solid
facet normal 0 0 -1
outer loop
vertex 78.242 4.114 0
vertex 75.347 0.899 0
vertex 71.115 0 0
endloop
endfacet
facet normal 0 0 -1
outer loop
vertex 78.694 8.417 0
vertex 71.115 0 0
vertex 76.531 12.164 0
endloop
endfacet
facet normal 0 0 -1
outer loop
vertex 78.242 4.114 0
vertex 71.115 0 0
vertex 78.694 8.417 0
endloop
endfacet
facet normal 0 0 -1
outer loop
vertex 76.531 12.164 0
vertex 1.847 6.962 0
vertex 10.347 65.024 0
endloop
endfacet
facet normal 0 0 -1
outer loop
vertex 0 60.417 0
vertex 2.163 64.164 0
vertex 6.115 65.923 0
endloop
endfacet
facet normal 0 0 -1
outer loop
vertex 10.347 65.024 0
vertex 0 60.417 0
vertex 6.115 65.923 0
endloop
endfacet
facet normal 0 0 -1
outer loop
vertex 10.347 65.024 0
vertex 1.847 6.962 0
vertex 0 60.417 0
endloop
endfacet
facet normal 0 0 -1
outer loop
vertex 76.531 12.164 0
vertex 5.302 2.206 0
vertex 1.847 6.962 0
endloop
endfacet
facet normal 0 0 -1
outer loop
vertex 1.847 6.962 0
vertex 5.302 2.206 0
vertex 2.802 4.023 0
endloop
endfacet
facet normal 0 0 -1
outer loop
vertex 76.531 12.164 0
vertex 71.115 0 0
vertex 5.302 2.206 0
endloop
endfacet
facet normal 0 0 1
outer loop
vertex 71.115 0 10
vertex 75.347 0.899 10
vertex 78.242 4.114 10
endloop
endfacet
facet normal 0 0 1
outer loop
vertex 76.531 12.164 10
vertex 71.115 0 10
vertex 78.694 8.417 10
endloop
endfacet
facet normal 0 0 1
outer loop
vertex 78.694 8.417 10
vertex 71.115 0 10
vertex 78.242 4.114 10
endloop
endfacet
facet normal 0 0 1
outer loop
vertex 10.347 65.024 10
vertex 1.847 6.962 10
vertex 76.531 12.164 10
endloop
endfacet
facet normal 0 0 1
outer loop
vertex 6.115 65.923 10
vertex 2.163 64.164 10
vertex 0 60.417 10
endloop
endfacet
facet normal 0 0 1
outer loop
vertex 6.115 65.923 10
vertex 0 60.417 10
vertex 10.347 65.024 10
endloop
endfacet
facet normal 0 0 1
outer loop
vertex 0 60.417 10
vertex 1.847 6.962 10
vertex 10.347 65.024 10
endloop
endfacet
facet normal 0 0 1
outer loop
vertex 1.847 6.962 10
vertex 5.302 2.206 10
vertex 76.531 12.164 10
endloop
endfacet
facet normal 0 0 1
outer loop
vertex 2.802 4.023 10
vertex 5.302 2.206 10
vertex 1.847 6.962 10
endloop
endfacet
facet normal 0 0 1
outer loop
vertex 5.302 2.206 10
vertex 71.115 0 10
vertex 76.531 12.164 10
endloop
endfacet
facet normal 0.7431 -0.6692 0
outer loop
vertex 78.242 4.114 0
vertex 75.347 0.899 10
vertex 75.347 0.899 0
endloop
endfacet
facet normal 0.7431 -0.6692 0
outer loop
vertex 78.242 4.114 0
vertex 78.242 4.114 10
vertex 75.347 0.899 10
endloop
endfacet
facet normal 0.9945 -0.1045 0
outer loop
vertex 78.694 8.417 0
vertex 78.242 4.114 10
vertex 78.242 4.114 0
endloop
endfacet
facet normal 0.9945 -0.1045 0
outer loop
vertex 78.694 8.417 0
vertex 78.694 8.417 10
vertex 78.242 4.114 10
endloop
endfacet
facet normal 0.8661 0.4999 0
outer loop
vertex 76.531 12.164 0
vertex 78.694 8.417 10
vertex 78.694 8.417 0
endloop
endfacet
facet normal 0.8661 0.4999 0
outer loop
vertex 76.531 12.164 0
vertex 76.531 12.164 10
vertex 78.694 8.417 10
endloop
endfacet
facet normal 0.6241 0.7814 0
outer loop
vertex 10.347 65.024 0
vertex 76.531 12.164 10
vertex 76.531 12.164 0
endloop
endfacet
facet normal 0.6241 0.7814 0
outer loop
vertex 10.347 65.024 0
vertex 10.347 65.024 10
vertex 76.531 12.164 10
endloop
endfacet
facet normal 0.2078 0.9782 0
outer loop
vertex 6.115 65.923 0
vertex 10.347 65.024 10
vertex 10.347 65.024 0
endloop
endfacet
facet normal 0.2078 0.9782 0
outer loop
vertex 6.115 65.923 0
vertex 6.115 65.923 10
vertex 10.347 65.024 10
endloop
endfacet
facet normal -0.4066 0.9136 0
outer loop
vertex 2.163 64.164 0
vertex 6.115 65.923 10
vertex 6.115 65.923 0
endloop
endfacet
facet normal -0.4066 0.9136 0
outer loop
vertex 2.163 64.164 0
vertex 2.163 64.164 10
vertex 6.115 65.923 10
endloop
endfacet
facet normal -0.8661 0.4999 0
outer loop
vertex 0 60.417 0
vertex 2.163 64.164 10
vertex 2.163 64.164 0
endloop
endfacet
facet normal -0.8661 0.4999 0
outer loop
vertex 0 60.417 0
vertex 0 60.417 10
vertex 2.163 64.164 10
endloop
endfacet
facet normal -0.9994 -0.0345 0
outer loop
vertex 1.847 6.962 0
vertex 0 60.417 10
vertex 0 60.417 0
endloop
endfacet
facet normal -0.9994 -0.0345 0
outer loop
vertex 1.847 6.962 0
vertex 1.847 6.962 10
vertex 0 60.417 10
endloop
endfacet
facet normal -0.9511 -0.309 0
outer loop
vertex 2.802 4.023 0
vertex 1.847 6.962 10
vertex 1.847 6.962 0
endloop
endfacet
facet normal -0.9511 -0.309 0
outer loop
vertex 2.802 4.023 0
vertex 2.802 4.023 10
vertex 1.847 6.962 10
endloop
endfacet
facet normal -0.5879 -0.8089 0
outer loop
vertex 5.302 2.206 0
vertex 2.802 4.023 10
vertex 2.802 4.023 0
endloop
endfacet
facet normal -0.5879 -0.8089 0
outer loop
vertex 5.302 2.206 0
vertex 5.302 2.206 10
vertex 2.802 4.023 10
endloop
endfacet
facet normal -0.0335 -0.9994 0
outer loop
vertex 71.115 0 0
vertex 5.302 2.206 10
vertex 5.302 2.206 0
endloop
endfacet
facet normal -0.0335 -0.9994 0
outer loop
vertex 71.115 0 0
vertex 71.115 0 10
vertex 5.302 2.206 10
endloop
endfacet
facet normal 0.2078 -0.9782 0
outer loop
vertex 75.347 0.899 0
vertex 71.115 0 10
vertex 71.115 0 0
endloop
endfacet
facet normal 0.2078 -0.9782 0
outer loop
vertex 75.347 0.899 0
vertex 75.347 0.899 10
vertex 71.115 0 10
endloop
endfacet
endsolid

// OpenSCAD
$fn = 32;

// ----------------------------------------------------------------------
// Lever arm: two bosses 10 and 14 mm, 65 mm between centres
// ----------------------------------------------------------------------

// --- parameters (mm) ---
profile_height = 10;      // extrusion height
profile_points = 12;      // points of the closed outline

profile = [[0, 60.417], [1.847, 6.962], [2.802, 4.023], [5.302, 2.206], [71.115, 0], [75.347, 0.899], [78.242, 4.114], [78.694, 8.417], [76.531, 12.164], [10.347, 65.024], [6.115, 65.923], [2.163, 64.164]];  // single closed polygon, 12 points, counter clockwise

// --- the one profile operation ---
linear_extrude(height = profile_height) polygon(points = profile);
